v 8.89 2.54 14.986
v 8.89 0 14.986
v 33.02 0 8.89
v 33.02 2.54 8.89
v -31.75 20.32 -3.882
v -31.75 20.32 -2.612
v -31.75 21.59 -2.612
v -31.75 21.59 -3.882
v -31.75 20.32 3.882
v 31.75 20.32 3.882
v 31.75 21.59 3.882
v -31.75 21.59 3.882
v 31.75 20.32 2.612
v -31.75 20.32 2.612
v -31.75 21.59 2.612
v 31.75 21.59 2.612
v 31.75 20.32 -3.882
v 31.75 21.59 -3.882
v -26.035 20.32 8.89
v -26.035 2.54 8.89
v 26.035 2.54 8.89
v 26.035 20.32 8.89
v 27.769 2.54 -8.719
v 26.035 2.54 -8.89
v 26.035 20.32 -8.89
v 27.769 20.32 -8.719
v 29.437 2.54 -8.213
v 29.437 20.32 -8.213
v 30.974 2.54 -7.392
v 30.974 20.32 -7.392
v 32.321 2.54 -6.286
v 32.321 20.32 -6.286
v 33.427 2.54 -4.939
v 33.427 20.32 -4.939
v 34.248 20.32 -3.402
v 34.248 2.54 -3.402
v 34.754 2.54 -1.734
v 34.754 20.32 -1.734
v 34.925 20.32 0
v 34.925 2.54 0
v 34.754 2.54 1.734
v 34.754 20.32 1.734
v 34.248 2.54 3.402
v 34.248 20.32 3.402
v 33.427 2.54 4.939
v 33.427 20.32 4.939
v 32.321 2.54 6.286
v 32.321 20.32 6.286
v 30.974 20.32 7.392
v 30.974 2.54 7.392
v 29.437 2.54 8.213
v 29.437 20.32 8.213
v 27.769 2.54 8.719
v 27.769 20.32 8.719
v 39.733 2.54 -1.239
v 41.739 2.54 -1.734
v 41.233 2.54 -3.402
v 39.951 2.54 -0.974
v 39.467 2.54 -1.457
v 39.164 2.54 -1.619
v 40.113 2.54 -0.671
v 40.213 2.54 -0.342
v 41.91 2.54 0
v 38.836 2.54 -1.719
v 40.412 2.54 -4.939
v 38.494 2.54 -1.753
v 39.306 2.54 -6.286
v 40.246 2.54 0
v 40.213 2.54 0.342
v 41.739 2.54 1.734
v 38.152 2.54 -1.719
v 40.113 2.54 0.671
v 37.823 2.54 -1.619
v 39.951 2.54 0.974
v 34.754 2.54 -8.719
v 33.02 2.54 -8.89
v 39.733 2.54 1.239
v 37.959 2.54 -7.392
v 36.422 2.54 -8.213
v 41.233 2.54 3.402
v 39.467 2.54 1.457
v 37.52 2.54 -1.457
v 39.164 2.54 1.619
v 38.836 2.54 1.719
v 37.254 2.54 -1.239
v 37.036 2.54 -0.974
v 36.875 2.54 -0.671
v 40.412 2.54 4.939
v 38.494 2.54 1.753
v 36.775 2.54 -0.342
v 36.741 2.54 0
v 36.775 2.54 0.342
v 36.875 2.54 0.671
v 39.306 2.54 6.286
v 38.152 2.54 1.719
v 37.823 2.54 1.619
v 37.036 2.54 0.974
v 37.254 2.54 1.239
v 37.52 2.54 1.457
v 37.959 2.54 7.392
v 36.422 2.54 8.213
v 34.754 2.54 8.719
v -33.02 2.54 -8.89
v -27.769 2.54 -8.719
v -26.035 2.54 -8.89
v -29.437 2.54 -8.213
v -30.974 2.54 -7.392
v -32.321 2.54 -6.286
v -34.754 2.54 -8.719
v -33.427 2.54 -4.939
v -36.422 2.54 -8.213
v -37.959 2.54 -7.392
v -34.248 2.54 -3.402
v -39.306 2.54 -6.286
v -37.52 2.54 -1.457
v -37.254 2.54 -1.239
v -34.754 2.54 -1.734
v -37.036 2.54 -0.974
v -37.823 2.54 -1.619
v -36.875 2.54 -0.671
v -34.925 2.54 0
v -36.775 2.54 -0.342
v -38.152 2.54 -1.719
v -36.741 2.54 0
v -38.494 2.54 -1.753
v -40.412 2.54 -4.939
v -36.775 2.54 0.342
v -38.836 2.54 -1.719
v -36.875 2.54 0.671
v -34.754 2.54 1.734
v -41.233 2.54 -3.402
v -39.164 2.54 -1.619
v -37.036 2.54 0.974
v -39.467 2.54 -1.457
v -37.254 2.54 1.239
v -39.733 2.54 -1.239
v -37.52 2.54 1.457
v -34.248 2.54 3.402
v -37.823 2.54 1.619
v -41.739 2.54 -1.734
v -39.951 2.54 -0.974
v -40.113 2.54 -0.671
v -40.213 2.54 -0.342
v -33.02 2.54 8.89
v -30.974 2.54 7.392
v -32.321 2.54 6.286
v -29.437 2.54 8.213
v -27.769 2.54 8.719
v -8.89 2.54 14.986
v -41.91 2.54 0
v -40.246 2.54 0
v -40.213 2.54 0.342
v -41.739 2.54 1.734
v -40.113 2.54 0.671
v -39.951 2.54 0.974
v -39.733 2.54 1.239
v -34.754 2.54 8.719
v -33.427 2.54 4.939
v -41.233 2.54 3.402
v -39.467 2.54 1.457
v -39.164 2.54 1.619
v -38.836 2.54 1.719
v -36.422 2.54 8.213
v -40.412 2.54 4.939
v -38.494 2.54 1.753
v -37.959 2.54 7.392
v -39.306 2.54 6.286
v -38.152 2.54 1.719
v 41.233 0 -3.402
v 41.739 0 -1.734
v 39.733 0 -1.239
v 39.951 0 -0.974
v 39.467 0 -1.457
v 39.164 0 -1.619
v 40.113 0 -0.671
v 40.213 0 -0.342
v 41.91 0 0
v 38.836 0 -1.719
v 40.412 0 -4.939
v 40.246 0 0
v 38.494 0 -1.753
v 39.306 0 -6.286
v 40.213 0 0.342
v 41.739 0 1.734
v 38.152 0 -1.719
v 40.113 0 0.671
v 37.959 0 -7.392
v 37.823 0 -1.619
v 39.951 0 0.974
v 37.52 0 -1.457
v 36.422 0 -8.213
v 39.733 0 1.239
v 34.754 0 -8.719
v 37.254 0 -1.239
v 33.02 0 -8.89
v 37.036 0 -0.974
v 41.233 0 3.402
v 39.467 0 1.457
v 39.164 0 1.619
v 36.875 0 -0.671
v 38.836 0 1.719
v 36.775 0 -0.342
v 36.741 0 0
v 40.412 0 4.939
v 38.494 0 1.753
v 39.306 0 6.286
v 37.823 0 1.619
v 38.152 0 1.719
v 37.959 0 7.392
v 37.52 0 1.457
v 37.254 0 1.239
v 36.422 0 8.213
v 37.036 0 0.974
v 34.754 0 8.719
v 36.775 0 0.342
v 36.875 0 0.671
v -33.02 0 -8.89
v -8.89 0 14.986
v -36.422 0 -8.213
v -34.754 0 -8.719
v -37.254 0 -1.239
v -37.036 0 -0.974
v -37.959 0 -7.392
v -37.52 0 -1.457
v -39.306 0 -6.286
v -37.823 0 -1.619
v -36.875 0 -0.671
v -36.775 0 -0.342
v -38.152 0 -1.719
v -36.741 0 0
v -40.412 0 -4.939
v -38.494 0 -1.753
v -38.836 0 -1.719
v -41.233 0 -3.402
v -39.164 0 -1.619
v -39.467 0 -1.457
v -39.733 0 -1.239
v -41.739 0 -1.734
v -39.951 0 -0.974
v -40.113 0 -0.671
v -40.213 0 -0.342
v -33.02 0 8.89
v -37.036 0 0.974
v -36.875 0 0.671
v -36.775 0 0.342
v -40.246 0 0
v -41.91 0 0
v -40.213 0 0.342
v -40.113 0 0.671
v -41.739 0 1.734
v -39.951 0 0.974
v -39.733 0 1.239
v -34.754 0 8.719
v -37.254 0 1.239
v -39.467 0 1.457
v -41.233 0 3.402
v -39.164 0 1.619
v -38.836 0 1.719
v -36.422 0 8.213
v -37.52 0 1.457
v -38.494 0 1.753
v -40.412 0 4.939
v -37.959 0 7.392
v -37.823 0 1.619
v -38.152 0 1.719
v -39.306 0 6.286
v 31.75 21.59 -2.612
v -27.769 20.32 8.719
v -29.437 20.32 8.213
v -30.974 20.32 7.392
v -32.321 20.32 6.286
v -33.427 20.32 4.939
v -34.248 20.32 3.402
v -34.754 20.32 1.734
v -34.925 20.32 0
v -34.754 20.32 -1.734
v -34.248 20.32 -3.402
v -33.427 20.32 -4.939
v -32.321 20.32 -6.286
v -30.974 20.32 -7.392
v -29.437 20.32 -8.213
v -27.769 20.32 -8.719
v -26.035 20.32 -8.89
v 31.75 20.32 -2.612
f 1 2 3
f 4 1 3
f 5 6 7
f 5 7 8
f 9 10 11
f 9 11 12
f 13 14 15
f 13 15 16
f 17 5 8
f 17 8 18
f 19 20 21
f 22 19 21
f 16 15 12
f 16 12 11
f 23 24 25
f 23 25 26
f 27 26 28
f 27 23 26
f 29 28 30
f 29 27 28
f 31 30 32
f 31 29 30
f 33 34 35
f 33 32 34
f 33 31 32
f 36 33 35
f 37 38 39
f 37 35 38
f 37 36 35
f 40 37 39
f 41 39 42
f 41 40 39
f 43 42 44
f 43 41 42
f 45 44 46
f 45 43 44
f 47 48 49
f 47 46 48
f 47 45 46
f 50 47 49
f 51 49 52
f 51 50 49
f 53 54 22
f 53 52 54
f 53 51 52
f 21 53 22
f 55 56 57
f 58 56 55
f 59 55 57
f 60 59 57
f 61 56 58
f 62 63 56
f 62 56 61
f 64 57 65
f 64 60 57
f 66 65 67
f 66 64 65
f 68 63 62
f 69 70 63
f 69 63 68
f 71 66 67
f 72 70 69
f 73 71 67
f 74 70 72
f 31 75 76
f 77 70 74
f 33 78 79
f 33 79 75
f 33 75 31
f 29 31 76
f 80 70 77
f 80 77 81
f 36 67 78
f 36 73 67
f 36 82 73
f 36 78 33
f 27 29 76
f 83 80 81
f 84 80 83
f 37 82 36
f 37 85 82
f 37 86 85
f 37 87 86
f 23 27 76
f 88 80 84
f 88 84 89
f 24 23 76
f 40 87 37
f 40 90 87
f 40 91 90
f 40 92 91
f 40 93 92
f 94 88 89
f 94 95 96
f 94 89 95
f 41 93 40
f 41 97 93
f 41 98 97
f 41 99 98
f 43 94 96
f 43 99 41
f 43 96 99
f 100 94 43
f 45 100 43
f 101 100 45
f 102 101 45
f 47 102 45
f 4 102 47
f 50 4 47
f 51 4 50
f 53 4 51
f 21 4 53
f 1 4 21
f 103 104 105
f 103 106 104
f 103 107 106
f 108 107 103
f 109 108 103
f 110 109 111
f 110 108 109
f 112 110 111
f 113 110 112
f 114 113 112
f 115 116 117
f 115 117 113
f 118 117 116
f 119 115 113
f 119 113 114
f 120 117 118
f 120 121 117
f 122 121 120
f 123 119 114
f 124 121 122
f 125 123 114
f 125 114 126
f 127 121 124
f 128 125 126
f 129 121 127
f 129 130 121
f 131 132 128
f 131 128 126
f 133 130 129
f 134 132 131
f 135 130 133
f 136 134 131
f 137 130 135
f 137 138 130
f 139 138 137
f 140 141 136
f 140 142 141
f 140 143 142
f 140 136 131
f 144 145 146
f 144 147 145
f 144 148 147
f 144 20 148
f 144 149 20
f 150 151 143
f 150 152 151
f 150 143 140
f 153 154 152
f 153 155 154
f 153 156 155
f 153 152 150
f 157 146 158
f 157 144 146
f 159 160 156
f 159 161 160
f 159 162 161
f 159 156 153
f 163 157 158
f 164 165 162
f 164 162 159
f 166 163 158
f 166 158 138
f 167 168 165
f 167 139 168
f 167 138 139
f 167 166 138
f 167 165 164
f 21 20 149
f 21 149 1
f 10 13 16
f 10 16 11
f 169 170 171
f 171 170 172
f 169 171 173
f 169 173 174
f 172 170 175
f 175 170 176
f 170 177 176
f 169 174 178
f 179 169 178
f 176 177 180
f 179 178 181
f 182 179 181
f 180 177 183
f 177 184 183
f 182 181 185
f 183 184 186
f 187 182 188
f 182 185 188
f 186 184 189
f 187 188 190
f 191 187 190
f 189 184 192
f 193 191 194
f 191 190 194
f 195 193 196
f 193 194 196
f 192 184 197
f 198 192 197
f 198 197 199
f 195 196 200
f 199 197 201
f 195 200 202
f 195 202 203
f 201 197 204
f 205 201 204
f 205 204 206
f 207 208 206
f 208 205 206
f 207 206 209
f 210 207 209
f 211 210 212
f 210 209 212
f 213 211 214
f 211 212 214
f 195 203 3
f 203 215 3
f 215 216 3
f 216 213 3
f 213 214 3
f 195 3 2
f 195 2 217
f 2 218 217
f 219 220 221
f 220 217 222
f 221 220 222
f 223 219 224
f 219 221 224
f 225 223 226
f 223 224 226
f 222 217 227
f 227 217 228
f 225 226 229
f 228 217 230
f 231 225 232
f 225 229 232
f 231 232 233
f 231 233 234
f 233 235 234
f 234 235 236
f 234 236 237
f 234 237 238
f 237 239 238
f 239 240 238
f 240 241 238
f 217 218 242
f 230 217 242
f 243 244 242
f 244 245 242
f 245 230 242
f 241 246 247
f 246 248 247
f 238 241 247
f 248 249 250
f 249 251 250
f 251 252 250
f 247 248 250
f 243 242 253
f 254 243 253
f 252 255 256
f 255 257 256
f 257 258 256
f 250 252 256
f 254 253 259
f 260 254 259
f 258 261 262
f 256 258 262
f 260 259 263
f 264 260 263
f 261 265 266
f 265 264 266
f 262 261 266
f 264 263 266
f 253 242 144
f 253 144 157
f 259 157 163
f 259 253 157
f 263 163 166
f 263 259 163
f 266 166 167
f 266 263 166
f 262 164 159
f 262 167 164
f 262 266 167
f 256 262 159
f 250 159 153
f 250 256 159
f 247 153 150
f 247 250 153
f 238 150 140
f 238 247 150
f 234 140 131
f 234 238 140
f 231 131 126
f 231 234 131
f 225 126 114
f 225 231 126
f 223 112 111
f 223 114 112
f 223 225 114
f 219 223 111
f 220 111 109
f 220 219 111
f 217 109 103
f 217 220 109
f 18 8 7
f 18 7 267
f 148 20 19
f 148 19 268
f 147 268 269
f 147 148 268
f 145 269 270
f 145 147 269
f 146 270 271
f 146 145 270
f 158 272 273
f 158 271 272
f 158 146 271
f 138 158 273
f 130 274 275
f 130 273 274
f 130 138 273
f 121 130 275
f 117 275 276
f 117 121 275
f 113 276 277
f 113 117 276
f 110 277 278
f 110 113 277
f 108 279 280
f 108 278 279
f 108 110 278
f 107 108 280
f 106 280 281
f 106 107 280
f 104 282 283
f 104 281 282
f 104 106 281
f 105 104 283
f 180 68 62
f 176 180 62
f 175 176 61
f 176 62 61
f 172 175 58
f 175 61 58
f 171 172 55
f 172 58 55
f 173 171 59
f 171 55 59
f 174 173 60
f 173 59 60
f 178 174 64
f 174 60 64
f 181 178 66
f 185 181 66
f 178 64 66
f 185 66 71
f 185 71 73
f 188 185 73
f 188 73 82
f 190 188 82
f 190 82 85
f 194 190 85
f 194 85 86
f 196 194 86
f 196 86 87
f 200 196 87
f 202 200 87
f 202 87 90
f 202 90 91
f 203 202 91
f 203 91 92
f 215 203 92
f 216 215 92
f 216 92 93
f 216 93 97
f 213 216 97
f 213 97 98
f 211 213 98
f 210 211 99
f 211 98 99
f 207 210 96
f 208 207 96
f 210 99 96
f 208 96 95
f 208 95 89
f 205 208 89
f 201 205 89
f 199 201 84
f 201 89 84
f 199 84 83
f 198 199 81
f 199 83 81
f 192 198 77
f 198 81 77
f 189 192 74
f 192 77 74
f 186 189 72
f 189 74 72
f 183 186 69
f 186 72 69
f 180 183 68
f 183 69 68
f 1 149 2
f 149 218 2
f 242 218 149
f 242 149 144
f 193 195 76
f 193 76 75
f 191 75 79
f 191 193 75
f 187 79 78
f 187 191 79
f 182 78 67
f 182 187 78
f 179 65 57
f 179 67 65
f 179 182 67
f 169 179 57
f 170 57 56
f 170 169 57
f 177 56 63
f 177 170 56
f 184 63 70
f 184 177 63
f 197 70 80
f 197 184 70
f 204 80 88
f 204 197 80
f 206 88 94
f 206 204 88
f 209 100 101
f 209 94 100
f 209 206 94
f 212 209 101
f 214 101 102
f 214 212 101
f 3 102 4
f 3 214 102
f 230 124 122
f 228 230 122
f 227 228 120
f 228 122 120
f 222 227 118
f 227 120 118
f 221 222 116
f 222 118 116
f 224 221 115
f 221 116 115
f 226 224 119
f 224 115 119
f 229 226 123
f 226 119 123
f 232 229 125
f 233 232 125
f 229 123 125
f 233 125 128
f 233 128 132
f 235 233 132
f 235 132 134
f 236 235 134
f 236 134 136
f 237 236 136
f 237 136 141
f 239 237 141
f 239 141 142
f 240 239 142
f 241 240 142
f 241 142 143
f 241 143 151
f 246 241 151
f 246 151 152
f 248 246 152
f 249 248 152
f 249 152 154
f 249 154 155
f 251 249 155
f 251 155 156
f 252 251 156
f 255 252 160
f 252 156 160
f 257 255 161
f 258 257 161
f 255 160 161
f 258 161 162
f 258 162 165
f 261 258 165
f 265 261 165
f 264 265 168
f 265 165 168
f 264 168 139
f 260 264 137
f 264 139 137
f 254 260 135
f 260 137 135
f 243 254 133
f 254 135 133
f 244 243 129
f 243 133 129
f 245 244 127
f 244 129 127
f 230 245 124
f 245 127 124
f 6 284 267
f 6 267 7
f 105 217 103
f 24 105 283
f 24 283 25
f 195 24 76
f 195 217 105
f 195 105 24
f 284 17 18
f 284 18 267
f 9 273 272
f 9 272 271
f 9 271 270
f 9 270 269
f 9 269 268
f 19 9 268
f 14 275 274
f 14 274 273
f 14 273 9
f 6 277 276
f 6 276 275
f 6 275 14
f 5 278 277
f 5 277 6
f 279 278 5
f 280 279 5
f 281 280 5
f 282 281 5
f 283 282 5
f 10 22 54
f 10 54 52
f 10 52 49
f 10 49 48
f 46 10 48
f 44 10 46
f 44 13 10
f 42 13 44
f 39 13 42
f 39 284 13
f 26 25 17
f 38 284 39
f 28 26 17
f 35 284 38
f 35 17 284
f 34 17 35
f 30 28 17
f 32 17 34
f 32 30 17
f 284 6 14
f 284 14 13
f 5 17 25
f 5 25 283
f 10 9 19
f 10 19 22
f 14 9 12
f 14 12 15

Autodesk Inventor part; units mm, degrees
ref_plane "YZ Plane" through (0, 0, 0) normal (1, 0, 0) x (0, 1, 0)
ref_plane "XZ Plane" through (0, 0, 0) normal (0, 1, 0) x (-1, 0, 0)
ref_plane "XY Plane" through (0, 0, 0) normal (0, 0, 1) x (1, 0, 0)
sketch "Sketch1" plane through (0, 0, 0) normal (0, 1, 0) x (-1, 0, 0)
  line L0 (33.02, -8.89) -> (-33.02, -8.89)
  line L1 (-33.02, 8.89) -> (33.02, 8.89)
  arc A0 (33.02, -8.89) -> (33.02, 8.89) centre (33.02, 0) ccw
  arc A1 (-33.02, 8.89) -> (-33.02, -8.89) centre (-33.02, 0) ccw
  line L2 (41.91, -12.3525) -> (41.91, 10.1693) construction
  line L3 (-41.91, -12.3525) -> (-41.91, 10.1693) construction
  line L4 (8.89, 14.986) -> (-8.89, 14.986)
  line L5 (-8.89, 14.986) -> (-33.02, 8.89)
  line L6 (8.89, 14.986) -> (33.02, 8.89)
  point P0 (0, 0)
  dimension "d1" = 83.82
  dimension "d2" = 17.78
  dimension "d3" = 8.89
  dimension "d4" = 8.89
  dimension "d5" = 41.91
  dimension "d8" = 17.78
  dimension "d9" = 8.89
  dimension "d10" = 23.876
extrude "Extrusion1" add sketch "Sketch1" along normal blind 2.54
sketch "Sketch2" plane through (0, 2.54, 0) normal (0, 1, 0) x (1, 0, 0)
  line L0 (33.02, 8.89) -> (-33.02, 8.89) projected
  line L1 (-26.035, -8.89) -> (26.035, -8.89)
  line L2 (26.035, 8.89) -> (-26.035, 8.89)
  arc A0 (-26.035, 8.89) -> (-26.035, -8.89) centre (-26.035, 0) ccw
  arc A1 (26.035, -8.89) -> (26.035, 8.89) centre (26.035, 0) ccw
  line L3 (-34.925, 8.805) -> (-34.925, -8.975) construction
  line L4 (34.925, 8.805) -> (34.925, -8.975) construction
  point P0 (0, 0)
  point P1 (-26.035, 8.89)
  dimension "d11" = 69.85
  dimension "d12" = 17.78
  dimension "d13" = 8.89
  dimension "d14" = 34.925
extrude "Extrusion2" add sketch "Sketch2" along normal blind 17.78
sketch "Sketch3" plane through (0, 2.54, 0) normal (0, 1, 0) x (1, 0, 0)
  circle A0 centre (-38.4937, 0) radius 1.7526
  circle A1 centre (38.4937, 0) radius 1.7526
  line L0 (-40.2463, 0) -> (-41.91, 0) construction
  arc A2 (-33.02, 8.89) -> (-33.02, -8.89) centre (-33.02, 0) ccw projected
  line L1 (40.2463, 0) -> (41.91, 0) construction
  arc A3 (33.02, -8.89) -> (33.02, 8.89) centre (33.02, 0) ccw projected
  point P0 (0, 0)
  dimension "d18" = 3.5052
  dimension "d17" = 76.9874
extrude "Extrusion3" cut sketch "Sketch3" against normal blind 17.78
sketch "Sketch4" plane through (0, 20.32, 0) normal (0, 1, 0) x (1, 0, 0)
  line L0 (-31.75, 3.8822) -> (31.75, 3.8822)
  line L1 (31.75, 3.8822) -> (31.75, 2.6122)
  line L2 (31.75, 2.6122) -> (-31.75, 2.6122)
  line L3 (-31.75, 2.6122) -> (-31.75, 3.8822)
  line L4 (-31.75, -2.6122) -> (31.75, -2.6122)
  line L5 (31.75, -2.6122) -> (31.75, -3.8822)
  line L6 (31.75, -3.8822) -> (-31.75, -3.8822)
  line L7 (-31.75, -3.8822) -> (-31.75, -2.6122)
  line L8 (0, 0) -> (0, 2.6122) construction
  line L9 (0, 0) -> (0, -2.6122) construction
  point P0 (0, 0)
  dimension "d21" = 63.5
  dimension "d22" = 31.75
  dimension "d23" = 1.27
extrude "Extrusion4" add sketch "Sketch4" along normal blind 1.27
equation "\"d3\" = 0.5 * d2"
equation "\"d4\" = 0.5 * d2"
equation "\"d5\" = 0.5 * d1"
equation "\"d9\" = 0.5 * d8"
equation "\"d13\" = 0.5 * d12"
equation "\"d14\" = 0.5 * d11"
equation "\"d22\" = 0.5 * d21"
properties part number "Pickup"
